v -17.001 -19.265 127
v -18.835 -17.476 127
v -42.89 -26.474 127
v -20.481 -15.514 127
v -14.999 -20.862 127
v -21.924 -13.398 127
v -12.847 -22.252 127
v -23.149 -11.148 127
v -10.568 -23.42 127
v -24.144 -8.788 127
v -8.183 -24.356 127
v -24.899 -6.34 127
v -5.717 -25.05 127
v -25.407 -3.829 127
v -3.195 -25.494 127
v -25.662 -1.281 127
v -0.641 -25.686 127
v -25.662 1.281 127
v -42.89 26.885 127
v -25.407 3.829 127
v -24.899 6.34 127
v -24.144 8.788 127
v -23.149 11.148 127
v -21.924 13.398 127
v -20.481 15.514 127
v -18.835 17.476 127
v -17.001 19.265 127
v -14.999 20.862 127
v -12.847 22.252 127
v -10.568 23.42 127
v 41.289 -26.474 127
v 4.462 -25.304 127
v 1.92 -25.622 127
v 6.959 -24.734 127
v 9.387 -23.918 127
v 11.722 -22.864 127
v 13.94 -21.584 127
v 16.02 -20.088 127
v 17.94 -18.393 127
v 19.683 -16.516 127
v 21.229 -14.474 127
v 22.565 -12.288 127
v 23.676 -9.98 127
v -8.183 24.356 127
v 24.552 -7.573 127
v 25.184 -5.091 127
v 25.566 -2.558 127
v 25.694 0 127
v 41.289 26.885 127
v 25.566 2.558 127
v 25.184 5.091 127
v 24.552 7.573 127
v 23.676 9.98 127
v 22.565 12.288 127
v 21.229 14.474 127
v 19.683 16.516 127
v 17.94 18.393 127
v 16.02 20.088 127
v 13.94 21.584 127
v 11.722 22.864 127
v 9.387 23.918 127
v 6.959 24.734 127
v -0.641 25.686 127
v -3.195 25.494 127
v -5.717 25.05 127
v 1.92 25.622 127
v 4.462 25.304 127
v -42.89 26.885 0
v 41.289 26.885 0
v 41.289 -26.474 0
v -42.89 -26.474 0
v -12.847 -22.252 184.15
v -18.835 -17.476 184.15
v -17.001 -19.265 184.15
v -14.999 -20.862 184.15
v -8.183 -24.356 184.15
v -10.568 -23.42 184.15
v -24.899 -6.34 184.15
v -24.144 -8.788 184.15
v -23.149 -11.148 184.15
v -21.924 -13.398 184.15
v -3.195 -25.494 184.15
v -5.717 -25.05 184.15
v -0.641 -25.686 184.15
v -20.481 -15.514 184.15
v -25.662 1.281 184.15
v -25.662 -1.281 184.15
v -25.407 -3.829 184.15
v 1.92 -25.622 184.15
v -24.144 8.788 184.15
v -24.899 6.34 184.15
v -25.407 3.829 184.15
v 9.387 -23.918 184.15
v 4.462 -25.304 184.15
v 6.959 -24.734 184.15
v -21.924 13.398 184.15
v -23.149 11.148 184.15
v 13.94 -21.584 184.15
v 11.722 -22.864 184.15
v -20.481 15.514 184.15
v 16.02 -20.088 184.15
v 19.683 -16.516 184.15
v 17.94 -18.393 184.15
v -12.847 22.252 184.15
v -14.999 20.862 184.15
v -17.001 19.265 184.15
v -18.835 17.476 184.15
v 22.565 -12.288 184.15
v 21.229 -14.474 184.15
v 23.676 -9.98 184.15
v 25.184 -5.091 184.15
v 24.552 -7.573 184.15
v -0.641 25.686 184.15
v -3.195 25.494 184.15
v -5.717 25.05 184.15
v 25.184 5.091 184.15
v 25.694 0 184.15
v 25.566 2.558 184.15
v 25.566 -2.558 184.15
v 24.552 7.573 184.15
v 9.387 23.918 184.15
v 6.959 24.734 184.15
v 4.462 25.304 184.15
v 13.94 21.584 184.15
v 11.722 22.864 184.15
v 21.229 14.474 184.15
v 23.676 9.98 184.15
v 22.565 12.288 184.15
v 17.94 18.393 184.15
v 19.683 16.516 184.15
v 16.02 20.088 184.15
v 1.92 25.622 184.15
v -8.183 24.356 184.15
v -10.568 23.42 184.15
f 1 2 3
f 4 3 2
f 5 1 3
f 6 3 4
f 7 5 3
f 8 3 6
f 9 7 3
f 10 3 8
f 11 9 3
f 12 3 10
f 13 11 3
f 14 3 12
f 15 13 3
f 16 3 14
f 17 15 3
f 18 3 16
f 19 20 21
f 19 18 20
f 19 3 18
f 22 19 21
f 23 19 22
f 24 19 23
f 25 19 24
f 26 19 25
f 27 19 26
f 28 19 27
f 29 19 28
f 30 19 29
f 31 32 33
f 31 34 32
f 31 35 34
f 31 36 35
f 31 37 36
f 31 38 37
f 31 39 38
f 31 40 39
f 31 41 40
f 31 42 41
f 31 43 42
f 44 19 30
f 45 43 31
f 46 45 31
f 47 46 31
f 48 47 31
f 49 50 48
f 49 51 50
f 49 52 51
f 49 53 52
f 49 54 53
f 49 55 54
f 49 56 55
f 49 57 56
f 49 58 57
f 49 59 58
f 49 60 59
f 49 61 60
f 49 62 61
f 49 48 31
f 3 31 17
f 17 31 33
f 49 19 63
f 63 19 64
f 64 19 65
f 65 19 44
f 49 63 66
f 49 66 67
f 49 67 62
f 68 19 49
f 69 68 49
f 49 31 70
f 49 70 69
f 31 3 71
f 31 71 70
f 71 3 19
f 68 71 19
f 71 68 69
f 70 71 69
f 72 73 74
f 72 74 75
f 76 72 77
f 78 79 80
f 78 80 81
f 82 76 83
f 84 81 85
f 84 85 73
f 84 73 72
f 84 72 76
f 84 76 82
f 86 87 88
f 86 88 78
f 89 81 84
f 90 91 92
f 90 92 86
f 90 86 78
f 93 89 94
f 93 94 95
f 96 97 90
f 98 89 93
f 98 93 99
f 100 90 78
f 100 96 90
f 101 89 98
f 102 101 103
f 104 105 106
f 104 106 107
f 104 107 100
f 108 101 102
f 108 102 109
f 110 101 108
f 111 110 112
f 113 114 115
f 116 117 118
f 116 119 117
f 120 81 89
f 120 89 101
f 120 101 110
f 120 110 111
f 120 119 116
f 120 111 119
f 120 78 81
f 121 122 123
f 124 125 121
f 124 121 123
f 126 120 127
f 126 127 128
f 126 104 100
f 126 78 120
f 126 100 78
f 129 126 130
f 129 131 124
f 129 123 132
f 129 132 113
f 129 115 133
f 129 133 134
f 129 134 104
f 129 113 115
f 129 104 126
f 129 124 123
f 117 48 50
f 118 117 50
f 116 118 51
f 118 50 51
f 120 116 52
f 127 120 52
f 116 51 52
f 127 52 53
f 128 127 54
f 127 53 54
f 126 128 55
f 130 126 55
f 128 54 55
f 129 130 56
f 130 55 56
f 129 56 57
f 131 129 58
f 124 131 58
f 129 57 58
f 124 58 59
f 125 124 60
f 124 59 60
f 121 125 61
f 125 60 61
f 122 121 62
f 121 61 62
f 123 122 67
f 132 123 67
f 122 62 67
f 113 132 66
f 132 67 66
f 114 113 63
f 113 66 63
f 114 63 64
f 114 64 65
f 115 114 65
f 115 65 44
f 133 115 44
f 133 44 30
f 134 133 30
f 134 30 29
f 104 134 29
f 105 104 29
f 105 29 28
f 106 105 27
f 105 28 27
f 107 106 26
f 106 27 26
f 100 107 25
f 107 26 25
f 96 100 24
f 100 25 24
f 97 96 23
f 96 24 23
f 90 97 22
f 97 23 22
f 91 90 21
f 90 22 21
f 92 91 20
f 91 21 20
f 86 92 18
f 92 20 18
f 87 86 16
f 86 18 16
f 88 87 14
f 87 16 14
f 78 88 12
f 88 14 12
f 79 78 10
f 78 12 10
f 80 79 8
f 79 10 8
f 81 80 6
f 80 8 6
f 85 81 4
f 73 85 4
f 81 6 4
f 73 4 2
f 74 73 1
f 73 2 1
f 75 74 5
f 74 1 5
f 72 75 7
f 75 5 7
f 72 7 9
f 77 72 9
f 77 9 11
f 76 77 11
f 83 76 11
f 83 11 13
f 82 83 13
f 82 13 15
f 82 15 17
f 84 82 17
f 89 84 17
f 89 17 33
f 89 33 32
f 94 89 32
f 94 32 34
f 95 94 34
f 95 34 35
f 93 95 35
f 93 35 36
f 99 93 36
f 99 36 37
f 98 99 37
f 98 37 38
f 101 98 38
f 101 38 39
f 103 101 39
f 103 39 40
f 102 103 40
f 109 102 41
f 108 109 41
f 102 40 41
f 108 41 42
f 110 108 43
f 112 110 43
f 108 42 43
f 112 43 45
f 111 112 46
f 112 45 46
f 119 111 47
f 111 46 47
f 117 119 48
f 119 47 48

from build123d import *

# Parameters (mm, degrees)
F0_R     = 29.8738984084
F1_DEPTH = 101.6
F3_W     = 84.1787829995
F3_H     = 53.359227255
F4_DEPTH = 127
F5_R     = 25.6938626455
F6_DEPTH = 57.15


with BuildPart() as f1:
    # F0 (on Top) → F1 (new body)
    with BuildSketch(Plane.XY):
        Circle(F0_R)
    extrude(amount=F1_DEPTH)


with BuildPart() as f4:
    # F3 (on Top) → F4 (new body)
    with BuildSketch(Plane.XY):
        with Locations((-0.8001253009, 0.2058306709)):
            Rectangle(F3_W, F3_H)
    extrude(amount=F4_DEPTH)

    # F5 (on face) → F6 (join)
    with BuildSketch(Plane.XY.offset(127)):
        Circle(F5_R)
    extrude(amount=F6_DEPTH)


solid = f4.part
